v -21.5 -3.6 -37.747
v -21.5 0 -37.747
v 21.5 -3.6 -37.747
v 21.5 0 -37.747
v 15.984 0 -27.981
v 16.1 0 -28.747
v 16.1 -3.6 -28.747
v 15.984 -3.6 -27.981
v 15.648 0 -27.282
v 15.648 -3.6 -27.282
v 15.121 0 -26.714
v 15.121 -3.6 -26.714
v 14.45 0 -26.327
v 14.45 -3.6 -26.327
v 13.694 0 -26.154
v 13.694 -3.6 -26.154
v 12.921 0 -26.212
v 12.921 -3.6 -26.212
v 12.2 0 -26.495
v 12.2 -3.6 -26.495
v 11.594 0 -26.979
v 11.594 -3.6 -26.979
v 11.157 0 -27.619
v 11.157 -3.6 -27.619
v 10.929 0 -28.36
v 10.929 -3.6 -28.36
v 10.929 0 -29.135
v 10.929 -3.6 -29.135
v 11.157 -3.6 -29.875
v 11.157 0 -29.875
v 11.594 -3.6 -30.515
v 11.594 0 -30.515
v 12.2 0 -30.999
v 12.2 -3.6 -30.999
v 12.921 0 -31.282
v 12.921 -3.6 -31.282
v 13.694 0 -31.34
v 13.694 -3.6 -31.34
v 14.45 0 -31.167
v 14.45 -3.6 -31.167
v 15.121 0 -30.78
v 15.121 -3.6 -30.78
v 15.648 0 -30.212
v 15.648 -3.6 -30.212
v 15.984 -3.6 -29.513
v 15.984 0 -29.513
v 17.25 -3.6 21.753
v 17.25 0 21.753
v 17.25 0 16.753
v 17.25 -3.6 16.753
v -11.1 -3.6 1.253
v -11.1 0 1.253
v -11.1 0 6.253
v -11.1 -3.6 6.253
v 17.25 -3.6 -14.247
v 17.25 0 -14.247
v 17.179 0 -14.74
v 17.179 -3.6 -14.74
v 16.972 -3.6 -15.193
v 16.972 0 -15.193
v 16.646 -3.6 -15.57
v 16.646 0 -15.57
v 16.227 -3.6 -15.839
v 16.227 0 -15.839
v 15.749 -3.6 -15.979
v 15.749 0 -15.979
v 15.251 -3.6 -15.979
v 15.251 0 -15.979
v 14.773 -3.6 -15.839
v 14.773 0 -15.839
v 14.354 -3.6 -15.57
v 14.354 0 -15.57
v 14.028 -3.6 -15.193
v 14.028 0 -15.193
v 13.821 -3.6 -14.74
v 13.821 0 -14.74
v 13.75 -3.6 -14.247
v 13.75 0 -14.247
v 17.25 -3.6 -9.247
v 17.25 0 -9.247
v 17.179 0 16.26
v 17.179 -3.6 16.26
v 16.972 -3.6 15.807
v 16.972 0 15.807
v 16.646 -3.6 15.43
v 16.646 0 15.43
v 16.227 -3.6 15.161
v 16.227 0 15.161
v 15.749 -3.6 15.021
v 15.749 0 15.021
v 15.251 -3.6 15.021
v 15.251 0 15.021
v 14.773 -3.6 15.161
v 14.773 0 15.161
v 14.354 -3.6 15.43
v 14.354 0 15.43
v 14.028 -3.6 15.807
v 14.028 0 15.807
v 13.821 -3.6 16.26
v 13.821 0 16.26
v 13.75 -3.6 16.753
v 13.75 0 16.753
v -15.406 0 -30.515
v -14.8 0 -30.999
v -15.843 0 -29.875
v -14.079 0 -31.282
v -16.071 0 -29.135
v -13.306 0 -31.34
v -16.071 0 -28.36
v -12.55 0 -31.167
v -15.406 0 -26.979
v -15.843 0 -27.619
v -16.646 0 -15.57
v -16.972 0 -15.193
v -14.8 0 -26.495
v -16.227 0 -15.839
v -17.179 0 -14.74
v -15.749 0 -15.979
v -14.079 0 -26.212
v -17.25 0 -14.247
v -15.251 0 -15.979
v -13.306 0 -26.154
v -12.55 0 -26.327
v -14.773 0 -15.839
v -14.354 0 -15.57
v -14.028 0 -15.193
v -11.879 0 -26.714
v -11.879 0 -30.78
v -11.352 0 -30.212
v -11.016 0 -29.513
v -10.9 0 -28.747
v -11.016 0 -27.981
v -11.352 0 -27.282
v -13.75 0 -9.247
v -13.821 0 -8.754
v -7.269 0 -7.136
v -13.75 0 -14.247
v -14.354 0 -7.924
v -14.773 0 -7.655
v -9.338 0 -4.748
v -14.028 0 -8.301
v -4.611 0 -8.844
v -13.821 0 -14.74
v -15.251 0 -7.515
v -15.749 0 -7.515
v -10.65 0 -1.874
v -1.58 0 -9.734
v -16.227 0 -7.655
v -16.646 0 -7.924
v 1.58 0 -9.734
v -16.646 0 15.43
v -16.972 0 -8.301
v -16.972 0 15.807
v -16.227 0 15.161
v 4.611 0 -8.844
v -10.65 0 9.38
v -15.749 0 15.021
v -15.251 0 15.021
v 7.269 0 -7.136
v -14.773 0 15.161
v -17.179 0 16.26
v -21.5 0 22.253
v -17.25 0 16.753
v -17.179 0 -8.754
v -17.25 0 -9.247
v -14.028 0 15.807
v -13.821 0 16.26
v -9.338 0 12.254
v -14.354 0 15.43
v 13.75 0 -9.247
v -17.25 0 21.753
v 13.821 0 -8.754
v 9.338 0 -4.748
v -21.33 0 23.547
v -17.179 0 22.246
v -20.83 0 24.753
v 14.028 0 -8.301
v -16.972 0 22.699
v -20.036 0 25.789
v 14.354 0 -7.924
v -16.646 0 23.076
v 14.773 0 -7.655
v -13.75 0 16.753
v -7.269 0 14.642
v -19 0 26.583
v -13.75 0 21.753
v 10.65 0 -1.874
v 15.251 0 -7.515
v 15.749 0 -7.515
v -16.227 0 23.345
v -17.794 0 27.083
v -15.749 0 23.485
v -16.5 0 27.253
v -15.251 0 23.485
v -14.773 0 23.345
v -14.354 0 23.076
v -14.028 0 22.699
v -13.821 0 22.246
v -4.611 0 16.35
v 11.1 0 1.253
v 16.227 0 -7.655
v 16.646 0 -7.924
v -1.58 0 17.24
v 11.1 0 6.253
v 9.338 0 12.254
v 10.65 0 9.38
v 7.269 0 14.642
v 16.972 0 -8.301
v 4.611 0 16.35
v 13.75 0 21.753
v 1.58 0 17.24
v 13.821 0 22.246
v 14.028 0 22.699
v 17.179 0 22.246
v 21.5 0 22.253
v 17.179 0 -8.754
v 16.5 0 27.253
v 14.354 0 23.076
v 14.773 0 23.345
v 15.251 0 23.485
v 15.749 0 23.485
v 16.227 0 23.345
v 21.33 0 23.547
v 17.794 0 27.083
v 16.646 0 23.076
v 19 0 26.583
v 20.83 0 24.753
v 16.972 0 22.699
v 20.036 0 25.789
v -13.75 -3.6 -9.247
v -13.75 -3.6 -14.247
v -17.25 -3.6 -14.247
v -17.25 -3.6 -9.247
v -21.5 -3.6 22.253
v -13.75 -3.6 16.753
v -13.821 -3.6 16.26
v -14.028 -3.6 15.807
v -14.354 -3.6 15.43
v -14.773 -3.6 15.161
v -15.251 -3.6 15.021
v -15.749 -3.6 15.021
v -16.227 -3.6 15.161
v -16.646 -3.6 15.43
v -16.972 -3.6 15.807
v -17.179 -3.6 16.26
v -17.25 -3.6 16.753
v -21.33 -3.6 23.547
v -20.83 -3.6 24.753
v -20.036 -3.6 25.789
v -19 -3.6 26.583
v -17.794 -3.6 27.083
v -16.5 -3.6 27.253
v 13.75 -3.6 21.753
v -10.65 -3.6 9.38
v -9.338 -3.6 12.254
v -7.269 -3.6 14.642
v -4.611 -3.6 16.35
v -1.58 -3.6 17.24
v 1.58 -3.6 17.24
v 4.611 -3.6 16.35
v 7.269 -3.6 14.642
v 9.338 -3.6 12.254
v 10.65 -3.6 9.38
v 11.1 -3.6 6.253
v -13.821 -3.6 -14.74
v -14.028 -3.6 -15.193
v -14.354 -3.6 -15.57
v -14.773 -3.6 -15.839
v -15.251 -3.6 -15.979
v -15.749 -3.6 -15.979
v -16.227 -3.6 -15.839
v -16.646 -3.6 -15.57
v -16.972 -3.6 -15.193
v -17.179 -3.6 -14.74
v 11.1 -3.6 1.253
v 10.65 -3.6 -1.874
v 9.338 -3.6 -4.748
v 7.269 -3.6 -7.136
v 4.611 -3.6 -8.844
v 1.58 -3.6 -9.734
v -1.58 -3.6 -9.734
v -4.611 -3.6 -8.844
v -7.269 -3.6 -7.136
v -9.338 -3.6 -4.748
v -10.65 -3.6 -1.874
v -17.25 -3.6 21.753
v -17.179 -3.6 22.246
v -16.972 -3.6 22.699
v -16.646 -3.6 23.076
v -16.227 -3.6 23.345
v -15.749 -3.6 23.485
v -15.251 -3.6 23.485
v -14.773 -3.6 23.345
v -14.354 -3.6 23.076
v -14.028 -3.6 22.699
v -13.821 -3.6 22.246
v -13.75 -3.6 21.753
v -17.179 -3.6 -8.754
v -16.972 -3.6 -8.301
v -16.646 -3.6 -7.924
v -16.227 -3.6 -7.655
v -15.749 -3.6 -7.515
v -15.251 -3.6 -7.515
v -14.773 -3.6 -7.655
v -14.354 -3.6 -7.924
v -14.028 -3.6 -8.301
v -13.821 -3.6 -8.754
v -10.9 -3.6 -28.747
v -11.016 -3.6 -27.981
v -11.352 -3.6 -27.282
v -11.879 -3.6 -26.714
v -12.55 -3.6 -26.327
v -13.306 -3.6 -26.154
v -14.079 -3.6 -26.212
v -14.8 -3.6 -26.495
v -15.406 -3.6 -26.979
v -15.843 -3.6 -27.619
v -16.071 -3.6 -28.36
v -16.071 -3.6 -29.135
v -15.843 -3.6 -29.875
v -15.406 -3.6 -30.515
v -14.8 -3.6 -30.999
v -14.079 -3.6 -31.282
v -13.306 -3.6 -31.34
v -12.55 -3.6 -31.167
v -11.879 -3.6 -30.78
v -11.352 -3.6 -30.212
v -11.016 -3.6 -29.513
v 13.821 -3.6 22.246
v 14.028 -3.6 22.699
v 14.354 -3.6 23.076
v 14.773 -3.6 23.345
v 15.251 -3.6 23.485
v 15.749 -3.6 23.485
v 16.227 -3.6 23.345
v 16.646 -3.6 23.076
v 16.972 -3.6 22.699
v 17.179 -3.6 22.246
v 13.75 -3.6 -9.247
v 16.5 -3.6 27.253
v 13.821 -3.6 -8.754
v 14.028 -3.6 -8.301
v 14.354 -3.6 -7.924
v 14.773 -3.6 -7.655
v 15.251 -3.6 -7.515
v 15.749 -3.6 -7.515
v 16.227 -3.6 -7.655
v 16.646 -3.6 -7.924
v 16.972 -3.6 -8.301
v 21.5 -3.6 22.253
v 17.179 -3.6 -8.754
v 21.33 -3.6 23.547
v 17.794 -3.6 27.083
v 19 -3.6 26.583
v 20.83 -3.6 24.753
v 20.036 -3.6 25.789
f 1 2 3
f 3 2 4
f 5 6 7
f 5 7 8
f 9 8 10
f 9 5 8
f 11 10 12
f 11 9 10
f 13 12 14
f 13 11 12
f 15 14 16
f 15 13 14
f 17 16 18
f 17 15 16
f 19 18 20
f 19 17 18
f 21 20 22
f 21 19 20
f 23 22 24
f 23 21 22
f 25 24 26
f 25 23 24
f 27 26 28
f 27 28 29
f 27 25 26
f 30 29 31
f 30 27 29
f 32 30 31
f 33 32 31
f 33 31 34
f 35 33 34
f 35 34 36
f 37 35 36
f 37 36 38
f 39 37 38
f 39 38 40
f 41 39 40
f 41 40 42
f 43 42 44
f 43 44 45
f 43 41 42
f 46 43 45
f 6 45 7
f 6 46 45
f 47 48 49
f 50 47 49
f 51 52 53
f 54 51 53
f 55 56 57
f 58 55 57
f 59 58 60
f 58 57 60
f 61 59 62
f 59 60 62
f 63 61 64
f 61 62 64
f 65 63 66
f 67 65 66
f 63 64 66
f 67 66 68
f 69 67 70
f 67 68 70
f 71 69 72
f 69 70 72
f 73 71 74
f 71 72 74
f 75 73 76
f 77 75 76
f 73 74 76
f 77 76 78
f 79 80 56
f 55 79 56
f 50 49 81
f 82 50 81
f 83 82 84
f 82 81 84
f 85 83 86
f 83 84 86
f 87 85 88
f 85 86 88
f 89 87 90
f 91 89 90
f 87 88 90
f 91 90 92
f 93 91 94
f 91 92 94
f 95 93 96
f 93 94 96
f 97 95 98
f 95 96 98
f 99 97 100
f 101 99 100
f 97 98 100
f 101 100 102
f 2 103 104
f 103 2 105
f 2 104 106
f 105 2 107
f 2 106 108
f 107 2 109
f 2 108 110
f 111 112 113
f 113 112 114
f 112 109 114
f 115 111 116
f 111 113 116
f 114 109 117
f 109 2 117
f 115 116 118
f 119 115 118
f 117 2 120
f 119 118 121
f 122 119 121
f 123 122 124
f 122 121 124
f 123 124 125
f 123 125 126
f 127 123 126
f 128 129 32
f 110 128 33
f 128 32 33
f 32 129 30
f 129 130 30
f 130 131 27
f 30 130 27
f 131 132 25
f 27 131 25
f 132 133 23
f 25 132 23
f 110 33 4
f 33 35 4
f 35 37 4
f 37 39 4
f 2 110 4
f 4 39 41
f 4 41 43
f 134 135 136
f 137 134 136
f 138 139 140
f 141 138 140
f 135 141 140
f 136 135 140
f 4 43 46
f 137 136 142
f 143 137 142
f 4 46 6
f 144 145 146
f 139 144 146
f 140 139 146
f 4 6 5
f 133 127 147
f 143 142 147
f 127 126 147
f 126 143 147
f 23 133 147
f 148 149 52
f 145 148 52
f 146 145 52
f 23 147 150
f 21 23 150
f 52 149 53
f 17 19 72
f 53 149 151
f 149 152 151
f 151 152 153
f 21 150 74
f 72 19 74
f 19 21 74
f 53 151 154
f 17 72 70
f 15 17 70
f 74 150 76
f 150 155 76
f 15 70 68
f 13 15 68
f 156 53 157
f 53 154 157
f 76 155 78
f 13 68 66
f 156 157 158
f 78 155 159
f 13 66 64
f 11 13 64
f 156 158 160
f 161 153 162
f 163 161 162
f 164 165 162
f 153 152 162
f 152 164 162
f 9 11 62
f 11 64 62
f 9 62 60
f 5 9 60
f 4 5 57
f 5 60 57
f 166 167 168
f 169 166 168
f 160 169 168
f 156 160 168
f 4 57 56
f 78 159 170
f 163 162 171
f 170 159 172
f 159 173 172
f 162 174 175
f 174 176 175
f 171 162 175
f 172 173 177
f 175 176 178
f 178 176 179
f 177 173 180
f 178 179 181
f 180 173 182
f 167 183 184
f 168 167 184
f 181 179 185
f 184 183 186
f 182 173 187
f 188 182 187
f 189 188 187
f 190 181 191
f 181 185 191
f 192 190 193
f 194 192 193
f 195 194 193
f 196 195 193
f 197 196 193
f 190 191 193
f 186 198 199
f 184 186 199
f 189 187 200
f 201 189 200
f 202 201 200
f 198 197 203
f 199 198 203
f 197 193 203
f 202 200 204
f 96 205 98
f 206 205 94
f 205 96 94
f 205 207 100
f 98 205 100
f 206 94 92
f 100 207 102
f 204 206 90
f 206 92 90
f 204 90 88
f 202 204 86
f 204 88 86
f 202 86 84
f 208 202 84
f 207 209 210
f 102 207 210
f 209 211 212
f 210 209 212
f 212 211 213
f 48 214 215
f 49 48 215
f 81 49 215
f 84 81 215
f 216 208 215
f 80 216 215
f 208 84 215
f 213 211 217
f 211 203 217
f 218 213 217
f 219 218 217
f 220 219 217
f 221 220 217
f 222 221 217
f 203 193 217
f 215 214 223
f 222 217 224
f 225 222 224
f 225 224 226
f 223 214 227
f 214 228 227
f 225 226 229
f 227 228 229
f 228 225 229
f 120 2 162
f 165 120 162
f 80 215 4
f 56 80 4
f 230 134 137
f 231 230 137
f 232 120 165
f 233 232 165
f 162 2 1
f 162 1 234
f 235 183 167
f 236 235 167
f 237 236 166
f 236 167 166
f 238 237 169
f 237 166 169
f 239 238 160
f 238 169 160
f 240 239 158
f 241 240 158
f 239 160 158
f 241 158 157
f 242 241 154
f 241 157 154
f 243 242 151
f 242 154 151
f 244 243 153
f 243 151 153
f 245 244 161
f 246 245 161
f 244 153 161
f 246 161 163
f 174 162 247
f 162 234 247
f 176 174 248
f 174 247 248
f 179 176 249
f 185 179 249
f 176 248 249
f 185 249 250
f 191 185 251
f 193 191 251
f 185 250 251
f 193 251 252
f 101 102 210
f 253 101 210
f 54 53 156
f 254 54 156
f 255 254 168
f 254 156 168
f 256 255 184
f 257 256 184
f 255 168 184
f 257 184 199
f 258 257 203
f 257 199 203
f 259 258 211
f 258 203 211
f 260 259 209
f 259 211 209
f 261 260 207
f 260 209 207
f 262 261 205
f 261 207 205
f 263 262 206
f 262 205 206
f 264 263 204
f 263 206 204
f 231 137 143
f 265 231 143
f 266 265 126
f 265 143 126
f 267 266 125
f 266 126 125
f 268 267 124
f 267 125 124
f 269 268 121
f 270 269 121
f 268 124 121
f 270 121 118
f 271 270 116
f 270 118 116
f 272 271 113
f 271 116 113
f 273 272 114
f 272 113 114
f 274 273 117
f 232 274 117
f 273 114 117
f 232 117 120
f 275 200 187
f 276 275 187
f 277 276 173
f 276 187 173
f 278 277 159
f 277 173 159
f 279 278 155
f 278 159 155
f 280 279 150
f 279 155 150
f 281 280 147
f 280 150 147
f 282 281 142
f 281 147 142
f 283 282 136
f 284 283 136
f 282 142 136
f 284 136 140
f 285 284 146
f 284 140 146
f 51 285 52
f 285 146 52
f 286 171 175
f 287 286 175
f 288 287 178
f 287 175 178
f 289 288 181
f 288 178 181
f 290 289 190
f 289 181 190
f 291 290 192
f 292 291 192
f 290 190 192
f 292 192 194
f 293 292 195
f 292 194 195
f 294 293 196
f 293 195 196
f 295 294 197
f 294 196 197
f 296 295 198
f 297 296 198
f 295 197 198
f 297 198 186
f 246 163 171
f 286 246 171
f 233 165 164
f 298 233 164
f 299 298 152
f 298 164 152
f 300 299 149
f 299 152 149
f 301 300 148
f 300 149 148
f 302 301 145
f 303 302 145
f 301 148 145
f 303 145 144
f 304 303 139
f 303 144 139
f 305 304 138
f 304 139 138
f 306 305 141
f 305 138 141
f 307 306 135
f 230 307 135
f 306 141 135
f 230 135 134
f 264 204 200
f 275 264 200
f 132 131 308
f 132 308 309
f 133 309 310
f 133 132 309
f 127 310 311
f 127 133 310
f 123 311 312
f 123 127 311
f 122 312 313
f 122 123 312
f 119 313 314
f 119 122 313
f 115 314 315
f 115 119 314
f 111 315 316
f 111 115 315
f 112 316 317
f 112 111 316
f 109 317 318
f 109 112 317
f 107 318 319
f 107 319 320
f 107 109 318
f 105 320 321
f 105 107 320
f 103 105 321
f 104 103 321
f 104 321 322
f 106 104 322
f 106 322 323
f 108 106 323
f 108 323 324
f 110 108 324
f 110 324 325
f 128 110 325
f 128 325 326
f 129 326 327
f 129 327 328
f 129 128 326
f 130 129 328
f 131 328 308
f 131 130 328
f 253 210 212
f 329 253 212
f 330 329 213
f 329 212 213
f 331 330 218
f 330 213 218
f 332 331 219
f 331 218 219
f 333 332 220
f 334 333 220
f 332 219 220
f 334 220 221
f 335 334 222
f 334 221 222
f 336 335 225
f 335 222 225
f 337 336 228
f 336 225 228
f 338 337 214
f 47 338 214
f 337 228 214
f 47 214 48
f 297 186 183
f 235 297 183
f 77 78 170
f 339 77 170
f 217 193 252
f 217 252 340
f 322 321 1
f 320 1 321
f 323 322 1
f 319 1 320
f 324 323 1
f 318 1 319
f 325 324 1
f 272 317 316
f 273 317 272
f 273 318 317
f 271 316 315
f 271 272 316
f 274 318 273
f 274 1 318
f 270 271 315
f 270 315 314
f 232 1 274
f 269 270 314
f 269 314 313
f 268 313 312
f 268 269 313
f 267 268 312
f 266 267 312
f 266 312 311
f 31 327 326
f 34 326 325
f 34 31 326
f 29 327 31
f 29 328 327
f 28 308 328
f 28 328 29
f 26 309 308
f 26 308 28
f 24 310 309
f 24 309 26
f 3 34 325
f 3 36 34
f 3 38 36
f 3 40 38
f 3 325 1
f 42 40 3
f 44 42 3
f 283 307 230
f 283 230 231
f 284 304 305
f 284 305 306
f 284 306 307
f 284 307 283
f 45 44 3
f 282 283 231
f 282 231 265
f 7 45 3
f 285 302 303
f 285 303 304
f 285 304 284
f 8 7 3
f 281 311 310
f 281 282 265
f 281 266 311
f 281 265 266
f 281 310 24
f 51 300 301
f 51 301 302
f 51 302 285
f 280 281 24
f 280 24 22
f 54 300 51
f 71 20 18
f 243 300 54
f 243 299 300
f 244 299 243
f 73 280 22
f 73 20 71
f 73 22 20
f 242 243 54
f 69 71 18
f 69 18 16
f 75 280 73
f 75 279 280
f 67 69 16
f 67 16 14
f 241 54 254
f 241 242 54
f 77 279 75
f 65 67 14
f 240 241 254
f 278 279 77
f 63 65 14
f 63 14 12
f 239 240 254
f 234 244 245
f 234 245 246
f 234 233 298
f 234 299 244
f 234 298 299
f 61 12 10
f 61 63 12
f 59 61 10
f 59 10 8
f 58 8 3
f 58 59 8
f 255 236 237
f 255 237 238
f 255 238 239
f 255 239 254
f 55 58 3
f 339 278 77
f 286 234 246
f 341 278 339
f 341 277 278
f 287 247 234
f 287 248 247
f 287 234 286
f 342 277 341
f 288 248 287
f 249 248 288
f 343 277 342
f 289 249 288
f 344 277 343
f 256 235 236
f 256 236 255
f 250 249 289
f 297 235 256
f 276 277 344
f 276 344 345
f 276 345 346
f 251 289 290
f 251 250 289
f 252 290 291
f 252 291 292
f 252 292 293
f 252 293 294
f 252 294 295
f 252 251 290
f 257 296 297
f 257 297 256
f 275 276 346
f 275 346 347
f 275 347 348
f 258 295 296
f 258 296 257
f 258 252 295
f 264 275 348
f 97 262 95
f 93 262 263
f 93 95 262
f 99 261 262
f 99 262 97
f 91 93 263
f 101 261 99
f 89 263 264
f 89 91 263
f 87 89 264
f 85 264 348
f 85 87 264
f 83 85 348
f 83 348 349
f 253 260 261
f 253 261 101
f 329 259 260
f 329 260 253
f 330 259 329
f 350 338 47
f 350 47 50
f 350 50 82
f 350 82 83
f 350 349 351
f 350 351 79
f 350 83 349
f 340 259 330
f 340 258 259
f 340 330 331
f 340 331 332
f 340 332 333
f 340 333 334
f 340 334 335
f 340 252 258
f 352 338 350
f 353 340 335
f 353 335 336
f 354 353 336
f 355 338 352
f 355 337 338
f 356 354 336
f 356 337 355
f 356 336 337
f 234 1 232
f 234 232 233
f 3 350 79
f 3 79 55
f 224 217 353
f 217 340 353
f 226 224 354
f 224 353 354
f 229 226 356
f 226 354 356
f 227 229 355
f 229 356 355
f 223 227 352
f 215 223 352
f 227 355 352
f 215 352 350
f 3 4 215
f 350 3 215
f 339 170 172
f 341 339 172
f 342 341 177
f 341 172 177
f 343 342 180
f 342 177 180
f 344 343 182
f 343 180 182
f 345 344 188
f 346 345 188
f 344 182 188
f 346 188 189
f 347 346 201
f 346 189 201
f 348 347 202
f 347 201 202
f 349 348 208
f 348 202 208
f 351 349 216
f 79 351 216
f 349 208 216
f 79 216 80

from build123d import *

# Parameters (mm, degrees)
F0_W     = 43
F0_H     = 65
F0_R     = 2.6
F1_DEPTH = 3.6
F2_R     = 5


with BuildPart() as f1:
    # F0 (on Front) → F1 (new body)
    with BuildSketch(Plane.XZ):
        with Locations((0, -5.247028)):
            Rectangle(F0_W, F0_H)
        with Locations((-13.5, -28.747028)):
            Circle(F0_R, mode=Mode.SUBTRACT)
        with BuildLine():
            ThreePointArc((-17.25, -9.247028), (-15.5, -7.497028), (-13.75, -9.247028))
            Line((-13.75, -9.247028), (-13.75, -14.247028))
            ThreePointArc((-13.75, -14.247028), (-15.5, -15.997028), (-17.25, -14.247028))
            Line((-17.25, -14.247028), (-17.25, -9.247028))
        make_face(mode=Mode.SUBTRACT)
        with Locations((13.5, -28.747028)):
            Circle(F0_R, mode=Mode.SUBTRACT)
        with BuildLine():
            ThreePointArc((13.75, -9.247028), (15.5, -7.497028), (17.25, -9.247028))
            Line((17.25, -9.247028), (17.25, -14.247028))
            ThreePointArc((17.25, -14.247028), (15.5, -15.997028), (13.75, -14.247028))
            Line((13.75, -14.247028), (13.75, -9.247028))
        make_face(mode=Mode.SUBTRACT)
        with BuildLine():
            ThreePointArc((-17.25, 21.752972), (-15.5, 23.502972), (-13.75, 21.752972))
            Line((-13.75, 21.752972), (-13.75, 16.752972))
            ThreePointArc((-13.75, 16.752972), (-15.5, 15.002972), (-17.25, 16.752972))
            Line((-17.25, 16.752972), (-17.25, 21.752972))
        make_face(mode=Mode.SUBTRACT)
        with BuildLine():
            ThreePointArc((11.1, 1.252972), (0, -9.847028), (-11.1, 1.252972))
            Line((-11.1, 1.252972), (-11.1, 6.252972))
            ThreePointArc((-11.1, 6.252972), (0, 17.352972), (11.1, 6.252972))
            Line((11.1, 6.252972), (11.1, 1.252972))
        make_face(mode=Mode.SUBTRACT)
        with BuildLine():
            ThreePointArc((13.75, 21.752972), (15.5, 23.502972), (17.25, 21.752972))
            Line((17.25, 21.752972), (17.25, 16.752972))
            ThreePointArc((17.25, 16.752972), (15.5, 15.002972), (13.75, 16.752972))
            Line((13.75, 16.752972), (13.75, 21.752972))
        make_face(mode=Mode.SUBTRACT)
    extrude(amount=F1_DEPTH)

    # F2
    f2_edges = [f1.edges().sort_by_distance(p)[0] for p in [
        (-21.5, -1.8, 27.252972),
        (21.5, -1.8, 27.252972),
    ]]
    fillet(f2_edges, radius=F2_R)


solid = f1.part
